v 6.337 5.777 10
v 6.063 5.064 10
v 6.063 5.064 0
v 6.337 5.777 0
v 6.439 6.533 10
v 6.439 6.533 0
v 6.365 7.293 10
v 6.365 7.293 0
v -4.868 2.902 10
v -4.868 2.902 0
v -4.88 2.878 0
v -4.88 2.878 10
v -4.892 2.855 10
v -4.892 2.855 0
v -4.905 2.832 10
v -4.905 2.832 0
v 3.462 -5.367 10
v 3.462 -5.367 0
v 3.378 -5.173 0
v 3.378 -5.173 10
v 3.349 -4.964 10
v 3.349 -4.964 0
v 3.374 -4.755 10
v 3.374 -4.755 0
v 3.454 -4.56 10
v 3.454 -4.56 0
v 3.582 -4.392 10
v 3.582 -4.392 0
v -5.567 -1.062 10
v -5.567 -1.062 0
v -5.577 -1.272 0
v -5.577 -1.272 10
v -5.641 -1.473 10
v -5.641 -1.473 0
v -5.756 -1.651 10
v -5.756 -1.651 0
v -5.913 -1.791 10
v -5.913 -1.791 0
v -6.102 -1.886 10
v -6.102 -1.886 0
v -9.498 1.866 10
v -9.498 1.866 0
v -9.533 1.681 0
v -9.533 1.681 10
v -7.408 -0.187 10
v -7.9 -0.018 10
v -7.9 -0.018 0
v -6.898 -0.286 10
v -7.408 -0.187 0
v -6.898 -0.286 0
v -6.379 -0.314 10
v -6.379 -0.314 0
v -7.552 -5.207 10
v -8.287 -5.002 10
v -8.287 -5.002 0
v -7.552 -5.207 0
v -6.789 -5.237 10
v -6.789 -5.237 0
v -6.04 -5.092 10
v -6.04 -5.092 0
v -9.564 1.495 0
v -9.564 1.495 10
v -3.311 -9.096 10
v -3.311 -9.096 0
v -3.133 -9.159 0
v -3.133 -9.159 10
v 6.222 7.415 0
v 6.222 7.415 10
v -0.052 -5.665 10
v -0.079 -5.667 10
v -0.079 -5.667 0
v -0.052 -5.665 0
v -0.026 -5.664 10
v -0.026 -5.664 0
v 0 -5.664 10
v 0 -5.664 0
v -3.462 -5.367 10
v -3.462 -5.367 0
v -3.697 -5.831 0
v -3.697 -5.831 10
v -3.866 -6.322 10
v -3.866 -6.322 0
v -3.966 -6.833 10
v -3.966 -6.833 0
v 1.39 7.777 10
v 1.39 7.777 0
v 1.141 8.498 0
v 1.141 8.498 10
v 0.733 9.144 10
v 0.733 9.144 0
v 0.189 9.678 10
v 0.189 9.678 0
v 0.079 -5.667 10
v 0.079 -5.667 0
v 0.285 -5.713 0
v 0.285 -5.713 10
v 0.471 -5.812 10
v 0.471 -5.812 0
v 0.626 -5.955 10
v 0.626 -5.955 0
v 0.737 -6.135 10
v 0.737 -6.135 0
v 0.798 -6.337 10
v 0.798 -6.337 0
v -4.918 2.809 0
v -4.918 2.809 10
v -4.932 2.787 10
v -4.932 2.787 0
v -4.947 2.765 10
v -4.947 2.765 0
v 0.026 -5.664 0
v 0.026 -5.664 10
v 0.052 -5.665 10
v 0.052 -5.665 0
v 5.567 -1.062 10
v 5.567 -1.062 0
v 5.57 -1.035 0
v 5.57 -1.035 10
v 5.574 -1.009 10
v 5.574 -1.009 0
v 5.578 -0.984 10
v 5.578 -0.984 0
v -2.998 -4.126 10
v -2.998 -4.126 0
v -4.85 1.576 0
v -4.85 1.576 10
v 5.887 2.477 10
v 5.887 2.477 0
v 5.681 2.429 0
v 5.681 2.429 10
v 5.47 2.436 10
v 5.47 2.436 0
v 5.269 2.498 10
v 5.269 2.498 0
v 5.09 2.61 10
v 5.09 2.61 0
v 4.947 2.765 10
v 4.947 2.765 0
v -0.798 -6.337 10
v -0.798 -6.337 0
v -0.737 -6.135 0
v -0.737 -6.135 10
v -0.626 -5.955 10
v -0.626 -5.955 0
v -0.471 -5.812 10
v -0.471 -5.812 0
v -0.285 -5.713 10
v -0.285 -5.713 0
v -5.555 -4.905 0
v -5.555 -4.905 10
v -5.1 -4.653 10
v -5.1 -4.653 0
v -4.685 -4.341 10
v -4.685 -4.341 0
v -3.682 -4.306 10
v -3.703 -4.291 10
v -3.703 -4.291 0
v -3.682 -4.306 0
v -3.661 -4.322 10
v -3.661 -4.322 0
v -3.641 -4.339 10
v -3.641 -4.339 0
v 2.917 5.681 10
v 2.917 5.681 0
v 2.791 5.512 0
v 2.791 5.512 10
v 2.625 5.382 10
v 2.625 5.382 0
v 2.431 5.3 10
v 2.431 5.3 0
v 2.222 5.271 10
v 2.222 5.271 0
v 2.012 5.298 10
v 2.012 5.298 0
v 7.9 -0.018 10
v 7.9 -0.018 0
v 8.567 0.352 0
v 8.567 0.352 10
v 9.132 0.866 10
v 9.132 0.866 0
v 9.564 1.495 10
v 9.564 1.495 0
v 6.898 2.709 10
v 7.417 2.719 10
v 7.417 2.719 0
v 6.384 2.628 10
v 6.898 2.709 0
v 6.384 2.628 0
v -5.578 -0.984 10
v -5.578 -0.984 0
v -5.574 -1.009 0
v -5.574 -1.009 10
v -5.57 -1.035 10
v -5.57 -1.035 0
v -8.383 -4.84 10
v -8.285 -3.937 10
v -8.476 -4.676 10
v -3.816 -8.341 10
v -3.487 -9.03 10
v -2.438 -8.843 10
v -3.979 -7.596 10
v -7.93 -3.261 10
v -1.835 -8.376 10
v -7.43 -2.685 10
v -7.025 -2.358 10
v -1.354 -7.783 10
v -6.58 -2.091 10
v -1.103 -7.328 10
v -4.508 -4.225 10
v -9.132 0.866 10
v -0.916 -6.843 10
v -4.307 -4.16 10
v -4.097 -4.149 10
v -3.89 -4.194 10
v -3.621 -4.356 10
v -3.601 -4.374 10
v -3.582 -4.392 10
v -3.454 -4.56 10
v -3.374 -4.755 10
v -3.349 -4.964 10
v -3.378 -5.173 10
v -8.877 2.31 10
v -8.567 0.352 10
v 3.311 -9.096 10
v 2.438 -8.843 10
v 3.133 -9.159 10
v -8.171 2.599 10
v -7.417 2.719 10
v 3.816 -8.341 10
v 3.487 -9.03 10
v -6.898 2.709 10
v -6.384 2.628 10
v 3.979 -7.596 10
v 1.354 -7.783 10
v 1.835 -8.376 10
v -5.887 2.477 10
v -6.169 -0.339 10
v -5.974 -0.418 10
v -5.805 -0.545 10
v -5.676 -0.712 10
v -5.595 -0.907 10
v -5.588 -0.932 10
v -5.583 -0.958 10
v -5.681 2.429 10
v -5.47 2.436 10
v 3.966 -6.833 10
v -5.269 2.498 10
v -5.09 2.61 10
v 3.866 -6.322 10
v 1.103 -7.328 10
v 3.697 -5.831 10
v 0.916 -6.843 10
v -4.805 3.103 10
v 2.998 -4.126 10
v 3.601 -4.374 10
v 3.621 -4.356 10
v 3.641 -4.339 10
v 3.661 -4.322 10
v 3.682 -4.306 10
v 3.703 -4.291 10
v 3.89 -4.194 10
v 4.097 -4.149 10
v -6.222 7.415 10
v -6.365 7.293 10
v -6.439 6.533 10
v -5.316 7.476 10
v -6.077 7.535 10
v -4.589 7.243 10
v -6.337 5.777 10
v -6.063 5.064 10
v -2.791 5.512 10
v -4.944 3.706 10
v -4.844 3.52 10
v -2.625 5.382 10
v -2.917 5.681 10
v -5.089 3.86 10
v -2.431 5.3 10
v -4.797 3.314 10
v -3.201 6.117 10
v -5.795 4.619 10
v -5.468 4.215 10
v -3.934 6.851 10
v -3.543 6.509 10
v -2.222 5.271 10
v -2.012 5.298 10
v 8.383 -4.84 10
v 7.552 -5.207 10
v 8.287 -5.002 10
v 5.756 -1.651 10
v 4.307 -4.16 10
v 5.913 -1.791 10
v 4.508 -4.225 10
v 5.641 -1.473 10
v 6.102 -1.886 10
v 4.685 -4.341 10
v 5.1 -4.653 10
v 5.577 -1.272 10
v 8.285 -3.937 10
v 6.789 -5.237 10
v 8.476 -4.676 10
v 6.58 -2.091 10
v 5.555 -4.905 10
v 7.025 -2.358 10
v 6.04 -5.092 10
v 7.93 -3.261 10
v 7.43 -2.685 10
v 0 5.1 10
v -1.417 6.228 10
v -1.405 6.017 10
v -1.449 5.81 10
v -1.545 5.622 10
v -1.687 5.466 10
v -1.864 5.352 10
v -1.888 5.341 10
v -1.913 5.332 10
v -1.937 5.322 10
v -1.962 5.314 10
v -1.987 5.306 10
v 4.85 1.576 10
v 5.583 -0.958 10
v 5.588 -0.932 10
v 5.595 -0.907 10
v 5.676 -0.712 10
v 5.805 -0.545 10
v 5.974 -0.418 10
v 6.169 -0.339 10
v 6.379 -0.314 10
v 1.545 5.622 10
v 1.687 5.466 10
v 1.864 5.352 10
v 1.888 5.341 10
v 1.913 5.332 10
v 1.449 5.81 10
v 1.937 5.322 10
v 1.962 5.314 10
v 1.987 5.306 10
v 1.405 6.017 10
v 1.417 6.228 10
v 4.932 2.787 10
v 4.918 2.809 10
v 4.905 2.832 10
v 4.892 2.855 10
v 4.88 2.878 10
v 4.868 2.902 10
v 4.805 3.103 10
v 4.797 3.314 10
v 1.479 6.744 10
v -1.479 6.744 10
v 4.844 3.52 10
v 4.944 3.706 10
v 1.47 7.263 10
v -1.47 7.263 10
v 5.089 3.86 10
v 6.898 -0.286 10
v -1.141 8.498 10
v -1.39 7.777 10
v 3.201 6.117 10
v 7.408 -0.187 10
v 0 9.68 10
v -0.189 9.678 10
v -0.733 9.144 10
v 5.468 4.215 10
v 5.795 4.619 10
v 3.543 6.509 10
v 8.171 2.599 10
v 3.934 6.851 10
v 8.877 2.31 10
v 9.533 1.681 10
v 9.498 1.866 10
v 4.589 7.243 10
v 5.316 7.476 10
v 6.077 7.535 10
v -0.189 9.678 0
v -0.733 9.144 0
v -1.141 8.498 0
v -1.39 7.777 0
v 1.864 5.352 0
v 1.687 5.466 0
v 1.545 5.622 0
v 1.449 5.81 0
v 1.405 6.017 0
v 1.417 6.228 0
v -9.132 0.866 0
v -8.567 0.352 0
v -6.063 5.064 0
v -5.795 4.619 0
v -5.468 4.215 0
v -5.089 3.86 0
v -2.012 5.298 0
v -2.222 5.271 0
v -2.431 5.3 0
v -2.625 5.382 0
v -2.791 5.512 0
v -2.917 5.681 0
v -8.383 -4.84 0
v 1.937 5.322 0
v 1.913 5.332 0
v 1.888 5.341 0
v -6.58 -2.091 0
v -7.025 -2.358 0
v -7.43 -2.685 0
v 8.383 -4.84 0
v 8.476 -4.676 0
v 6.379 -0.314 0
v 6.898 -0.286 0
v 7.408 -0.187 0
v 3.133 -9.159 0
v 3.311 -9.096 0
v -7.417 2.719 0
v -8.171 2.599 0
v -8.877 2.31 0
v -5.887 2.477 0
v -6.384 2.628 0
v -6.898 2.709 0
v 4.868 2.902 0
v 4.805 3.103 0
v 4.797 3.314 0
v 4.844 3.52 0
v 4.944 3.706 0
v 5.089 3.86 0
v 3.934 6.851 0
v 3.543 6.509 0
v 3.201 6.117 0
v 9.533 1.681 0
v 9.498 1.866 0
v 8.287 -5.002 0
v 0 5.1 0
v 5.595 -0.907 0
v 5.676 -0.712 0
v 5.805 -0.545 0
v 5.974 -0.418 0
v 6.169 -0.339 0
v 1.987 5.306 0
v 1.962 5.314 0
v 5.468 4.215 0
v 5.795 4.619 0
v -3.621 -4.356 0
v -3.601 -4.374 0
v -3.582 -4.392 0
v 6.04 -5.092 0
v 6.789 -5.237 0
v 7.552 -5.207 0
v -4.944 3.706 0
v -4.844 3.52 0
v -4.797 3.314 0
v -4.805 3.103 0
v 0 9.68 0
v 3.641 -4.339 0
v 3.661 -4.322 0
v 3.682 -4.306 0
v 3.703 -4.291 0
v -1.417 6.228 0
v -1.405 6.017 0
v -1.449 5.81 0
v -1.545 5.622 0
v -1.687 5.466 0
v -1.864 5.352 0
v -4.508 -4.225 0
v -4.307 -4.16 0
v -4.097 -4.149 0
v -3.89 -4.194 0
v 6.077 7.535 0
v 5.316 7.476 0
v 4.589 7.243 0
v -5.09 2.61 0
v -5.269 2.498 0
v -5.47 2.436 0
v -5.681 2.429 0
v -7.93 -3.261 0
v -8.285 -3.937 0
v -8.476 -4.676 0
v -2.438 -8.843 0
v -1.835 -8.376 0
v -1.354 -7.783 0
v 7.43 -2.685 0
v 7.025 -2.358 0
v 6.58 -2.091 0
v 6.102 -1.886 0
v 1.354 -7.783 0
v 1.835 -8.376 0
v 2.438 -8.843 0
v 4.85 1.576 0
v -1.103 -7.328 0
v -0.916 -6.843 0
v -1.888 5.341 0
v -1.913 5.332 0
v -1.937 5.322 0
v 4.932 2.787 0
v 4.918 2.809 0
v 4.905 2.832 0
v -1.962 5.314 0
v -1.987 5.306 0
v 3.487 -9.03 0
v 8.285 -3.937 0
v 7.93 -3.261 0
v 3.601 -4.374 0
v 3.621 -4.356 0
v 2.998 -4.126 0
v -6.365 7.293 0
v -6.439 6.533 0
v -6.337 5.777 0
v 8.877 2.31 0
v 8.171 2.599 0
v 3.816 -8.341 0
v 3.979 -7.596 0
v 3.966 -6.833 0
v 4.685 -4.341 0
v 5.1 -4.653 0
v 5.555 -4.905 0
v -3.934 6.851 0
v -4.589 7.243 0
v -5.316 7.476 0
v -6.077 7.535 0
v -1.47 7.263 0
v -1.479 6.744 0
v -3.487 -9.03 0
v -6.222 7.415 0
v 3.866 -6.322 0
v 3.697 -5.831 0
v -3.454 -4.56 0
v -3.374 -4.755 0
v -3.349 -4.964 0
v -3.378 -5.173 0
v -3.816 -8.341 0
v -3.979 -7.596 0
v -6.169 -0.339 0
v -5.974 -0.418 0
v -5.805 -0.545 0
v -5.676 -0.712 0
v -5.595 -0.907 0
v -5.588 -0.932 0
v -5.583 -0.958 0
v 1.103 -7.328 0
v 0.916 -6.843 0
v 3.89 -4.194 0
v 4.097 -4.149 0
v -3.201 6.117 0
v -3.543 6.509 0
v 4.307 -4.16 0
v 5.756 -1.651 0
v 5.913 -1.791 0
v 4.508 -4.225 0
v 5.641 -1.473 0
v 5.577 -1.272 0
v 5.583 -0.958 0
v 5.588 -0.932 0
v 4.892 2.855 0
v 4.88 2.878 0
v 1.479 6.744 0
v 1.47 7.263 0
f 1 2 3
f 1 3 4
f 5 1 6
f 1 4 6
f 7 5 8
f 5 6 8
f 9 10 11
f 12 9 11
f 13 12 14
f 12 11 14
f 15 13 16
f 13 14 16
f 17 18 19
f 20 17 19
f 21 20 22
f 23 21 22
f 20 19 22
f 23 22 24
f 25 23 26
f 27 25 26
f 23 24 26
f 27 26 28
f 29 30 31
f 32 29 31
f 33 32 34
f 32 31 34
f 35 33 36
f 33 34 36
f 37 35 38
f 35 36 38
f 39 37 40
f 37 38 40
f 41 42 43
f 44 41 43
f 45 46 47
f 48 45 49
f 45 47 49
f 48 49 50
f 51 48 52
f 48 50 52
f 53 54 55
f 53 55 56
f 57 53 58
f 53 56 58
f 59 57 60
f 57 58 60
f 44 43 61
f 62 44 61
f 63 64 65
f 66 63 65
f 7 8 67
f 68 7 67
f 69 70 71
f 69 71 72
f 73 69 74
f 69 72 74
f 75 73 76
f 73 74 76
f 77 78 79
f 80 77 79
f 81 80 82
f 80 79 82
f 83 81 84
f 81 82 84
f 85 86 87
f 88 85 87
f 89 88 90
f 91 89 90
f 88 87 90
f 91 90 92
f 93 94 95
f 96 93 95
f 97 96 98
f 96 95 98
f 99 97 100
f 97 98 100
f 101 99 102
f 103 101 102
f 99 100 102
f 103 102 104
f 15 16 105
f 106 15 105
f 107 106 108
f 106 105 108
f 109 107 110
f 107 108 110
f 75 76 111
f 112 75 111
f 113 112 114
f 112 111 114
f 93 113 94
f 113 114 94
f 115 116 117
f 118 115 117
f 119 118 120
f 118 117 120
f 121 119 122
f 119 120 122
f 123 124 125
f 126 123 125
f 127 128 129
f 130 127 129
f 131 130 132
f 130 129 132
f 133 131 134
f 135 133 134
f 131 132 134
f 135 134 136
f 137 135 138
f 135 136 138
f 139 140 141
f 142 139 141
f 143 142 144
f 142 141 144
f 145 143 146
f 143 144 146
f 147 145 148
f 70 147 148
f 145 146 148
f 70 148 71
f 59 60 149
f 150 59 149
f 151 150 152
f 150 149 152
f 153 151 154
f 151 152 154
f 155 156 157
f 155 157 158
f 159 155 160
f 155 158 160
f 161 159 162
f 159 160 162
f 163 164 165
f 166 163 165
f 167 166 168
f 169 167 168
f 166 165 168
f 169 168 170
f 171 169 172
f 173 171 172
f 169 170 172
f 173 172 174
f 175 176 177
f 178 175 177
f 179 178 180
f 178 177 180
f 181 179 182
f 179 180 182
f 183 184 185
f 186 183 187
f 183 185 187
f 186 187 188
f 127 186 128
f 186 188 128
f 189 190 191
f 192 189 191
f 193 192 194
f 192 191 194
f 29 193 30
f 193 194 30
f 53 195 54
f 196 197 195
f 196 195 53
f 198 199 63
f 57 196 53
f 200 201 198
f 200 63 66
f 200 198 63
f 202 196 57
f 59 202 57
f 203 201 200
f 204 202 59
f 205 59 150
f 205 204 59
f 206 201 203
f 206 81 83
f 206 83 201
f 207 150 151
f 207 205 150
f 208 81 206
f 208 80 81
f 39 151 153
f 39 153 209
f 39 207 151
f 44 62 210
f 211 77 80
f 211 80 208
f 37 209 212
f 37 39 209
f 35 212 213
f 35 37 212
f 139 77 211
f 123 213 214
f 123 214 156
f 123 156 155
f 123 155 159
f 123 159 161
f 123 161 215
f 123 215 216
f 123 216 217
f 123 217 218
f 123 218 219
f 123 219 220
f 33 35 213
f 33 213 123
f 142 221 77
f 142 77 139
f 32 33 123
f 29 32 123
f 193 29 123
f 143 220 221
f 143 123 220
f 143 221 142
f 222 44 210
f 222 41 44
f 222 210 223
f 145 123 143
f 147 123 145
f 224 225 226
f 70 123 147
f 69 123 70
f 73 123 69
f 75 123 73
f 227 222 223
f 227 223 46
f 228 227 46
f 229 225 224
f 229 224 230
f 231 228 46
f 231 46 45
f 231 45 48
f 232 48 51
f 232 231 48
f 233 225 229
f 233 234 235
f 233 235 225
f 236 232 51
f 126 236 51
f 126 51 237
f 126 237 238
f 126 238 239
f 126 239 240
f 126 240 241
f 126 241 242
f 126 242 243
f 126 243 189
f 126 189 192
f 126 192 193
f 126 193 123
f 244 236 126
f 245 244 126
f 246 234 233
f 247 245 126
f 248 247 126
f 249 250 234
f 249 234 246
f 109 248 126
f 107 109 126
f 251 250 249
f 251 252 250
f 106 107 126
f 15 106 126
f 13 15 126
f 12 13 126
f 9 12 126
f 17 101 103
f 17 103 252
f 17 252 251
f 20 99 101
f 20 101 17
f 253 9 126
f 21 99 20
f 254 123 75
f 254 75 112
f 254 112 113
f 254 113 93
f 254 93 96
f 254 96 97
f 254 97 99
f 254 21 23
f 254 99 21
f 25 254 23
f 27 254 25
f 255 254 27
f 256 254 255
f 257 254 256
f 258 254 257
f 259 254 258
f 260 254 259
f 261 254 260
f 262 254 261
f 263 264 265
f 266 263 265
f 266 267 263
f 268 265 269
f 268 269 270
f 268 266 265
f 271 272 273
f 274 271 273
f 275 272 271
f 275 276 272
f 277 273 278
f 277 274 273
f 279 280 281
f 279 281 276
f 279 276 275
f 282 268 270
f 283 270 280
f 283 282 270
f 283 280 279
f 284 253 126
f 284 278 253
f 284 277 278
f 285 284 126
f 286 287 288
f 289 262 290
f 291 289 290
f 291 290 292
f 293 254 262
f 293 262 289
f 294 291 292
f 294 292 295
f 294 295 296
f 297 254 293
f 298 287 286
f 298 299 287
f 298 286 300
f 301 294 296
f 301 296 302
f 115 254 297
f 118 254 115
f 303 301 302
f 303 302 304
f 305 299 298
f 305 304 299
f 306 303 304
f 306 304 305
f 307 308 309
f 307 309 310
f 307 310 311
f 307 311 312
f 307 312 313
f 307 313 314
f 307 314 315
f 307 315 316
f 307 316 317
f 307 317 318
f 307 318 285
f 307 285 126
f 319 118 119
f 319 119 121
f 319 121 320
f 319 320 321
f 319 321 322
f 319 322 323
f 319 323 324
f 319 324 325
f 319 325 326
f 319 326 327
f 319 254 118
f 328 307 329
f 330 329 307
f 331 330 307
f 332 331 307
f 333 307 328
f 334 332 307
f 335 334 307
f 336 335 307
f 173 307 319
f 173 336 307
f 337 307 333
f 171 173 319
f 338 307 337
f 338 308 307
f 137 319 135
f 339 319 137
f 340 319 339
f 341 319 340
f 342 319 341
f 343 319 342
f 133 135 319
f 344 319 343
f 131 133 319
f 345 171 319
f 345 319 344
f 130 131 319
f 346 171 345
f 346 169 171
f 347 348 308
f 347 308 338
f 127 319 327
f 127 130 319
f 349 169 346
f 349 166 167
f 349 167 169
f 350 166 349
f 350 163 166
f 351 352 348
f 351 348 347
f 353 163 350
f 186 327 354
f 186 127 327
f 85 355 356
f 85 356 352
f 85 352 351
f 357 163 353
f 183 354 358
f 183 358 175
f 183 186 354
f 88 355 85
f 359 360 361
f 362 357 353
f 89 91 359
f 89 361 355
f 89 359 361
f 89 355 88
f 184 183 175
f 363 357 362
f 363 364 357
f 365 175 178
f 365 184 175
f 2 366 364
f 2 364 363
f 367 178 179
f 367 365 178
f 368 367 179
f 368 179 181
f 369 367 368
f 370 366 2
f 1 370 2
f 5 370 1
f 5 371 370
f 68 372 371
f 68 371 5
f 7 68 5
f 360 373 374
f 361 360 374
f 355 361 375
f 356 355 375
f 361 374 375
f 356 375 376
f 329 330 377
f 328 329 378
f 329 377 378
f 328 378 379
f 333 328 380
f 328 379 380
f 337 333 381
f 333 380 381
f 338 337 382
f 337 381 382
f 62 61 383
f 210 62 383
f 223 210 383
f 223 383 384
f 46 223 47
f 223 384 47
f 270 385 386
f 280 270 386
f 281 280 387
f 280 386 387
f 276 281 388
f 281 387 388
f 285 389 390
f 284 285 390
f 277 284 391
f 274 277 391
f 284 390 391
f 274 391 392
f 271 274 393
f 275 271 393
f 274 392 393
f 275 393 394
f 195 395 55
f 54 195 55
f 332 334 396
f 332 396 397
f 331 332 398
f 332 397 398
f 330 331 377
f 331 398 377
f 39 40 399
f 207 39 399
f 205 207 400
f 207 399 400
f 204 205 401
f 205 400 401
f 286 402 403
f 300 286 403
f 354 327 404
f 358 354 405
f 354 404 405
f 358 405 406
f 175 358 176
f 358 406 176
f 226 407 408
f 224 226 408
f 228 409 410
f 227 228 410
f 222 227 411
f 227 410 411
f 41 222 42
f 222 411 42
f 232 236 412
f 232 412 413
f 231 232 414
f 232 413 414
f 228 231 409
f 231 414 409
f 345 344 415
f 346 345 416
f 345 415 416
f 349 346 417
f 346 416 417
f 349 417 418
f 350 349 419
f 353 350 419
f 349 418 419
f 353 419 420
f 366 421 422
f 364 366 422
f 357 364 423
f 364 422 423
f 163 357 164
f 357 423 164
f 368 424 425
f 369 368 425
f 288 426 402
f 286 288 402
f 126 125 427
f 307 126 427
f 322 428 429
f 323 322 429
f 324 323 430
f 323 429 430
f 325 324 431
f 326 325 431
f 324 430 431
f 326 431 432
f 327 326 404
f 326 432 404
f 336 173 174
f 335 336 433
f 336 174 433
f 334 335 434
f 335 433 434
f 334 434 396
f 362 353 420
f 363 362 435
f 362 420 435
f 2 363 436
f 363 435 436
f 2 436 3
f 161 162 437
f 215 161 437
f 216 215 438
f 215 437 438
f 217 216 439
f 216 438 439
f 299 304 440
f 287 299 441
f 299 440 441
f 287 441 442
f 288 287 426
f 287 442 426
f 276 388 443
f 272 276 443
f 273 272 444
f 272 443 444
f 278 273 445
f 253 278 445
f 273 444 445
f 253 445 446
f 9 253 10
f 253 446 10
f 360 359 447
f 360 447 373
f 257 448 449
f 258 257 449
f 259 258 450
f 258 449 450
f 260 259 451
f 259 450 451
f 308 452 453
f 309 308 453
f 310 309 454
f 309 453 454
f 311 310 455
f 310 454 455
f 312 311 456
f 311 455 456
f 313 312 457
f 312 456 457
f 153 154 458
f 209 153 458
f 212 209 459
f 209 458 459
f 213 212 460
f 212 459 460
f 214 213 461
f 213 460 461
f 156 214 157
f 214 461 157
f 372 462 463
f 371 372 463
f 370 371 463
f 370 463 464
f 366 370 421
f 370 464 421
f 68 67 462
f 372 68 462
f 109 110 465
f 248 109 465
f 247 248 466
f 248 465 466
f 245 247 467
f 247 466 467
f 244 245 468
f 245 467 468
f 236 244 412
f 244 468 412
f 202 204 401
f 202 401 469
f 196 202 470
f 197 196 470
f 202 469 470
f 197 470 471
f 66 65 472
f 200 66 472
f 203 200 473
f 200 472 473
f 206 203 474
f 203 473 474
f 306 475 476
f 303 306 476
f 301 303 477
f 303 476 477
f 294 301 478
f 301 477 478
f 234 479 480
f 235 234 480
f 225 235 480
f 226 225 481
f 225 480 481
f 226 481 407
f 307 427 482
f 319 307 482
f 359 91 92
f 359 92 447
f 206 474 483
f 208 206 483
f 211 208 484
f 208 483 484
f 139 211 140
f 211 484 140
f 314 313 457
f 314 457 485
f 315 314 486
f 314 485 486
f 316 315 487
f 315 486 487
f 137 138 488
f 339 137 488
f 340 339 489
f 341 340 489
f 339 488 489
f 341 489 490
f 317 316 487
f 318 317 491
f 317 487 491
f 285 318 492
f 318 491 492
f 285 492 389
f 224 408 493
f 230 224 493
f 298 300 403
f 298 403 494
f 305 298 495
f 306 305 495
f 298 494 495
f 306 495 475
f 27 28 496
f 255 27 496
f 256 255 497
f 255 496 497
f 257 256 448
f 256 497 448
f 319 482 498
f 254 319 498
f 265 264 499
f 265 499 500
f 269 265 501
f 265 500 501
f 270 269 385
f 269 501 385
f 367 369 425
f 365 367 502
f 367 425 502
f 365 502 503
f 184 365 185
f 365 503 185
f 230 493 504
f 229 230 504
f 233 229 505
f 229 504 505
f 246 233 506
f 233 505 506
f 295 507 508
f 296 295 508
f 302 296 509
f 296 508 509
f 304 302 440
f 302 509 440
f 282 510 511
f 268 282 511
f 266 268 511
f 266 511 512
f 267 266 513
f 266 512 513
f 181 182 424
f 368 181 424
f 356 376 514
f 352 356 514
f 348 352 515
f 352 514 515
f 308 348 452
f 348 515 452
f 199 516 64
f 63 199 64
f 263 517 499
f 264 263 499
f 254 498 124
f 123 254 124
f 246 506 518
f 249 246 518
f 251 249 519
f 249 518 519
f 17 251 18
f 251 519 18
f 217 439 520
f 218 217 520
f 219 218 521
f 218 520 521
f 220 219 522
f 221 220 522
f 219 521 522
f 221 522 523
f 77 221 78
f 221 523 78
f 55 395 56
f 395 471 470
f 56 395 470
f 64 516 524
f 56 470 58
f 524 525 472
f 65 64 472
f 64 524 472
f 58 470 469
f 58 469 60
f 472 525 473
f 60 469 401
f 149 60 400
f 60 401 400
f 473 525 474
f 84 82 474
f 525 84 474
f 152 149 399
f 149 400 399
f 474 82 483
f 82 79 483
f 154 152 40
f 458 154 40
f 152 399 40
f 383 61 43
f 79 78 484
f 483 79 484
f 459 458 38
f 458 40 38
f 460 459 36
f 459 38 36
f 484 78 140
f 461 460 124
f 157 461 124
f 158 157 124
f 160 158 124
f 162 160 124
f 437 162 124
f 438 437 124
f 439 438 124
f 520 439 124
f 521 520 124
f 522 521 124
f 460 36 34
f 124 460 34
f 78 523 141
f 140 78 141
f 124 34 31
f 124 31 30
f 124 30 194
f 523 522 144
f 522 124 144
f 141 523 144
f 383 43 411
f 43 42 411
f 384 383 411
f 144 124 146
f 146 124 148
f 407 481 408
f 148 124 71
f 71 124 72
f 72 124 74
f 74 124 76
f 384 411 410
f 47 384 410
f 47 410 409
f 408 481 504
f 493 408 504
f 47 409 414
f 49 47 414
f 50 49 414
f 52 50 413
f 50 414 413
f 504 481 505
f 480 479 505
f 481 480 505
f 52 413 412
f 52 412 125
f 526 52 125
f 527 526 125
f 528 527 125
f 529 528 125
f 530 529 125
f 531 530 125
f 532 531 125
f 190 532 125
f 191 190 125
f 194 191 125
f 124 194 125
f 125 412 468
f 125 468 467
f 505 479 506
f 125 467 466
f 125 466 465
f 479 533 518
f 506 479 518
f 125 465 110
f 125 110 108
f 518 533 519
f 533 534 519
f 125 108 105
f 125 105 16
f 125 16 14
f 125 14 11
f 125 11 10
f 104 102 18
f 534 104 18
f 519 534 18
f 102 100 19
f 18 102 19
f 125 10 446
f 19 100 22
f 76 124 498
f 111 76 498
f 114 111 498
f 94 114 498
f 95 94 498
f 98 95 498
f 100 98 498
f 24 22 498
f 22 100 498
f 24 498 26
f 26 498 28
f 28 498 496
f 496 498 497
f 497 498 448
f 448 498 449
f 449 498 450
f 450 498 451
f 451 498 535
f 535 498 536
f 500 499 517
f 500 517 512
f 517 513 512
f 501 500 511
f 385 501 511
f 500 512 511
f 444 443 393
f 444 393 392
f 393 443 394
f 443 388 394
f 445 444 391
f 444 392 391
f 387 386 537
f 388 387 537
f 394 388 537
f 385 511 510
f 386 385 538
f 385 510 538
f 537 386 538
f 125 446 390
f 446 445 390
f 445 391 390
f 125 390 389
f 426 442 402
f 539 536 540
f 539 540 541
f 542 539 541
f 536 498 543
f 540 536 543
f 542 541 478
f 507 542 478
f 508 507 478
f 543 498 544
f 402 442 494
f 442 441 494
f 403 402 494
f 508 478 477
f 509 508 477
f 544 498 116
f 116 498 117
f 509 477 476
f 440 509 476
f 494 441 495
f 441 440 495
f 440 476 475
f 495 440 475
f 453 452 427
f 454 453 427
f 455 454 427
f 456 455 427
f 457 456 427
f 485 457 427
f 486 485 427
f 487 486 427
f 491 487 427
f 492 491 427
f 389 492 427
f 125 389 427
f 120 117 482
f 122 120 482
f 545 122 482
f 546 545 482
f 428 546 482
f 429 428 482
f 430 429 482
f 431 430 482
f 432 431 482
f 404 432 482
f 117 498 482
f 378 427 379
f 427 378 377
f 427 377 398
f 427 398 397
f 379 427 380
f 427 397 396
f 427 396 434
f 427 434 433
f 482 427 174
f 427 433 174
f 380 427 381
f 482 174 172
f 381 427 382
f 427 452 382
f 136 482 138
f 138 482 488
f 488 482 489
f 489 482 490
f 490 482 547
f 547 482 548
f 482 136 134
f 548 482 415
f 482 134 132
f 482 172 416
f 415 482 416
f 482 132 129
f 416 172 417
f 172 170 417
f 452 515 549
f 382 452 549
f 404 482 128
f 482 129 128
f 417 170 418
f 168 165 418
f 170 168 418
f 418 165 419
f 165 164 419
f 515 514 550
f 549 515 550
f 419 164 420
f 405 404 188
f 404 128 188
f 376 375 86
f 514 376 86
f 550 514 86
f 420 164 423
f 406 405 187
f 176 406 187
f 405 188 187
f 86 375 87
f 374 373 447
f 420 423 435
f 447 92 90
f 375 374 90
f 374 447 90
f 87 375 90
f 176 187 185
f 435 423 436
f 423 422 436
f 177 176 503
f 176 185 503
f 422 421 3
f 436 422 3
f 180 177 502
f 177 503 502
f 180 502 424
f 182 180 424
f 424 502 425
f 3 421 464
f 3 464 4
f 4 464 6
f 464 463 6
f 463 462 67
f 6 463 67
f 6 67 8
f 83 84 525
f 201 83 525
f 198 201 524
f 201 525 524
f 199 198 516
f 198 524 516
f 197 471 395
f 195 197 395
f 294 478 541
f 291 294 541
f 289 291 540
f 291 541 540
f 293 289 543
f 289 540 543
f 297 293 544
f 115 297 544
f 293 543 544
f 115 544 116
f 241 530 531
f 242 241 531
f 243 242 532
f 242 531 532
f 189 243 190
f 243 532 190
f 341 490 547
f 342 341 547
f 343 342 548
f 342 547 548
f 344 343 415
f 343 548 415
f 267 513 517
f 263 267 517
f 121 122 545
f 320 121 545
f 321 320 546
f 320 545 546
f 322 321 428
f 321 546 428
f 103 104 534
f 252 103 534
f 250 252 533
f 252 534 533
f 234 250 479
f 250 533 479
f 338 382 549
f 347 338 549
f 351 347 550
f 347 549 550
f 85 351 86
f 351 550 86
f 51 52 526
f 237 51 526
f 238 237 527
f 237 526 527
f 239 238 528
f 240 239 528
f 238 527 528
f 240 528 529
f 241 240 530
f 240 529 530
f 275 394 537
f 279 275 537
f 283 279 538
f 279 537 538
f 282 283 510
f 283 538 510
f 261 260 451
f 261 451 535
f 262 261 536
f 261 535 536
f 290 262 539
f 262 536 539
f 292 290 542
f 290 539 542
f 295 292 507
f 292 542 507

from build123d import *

# Parameters (mm, degrees)
F1_DEPTH = 10


with BuildPart() as f1:
    # F0 (on Top) → F1 (new body)
    with BuildSketch(Plane.XY):
        with BuildLine():
            ThreePointArc((1.864316, 5.3522), (1.490455, 5.713083), (1.417156, 6.227511))
            ThreePointArc((1.417156, 6.227511), (1.483836, 7.003606), (1.389552, 7.776834))
            ThreePointArc((1.389552, 7.776834), (0.955753, 8.832789), (0.188574, 9.678163))
            Line((0.188574, 9.678163), (0, 9.68))
            Line((0, 9.68), (-0.188574, 9.678163))
            ThreePointArc((-0.188574, 9.678163), (-0.955753, 8.832789), (-1.389552, 7.776834))
            ThreePointArc((-1.389552, 7.776834), (-1.483836, 7.003606), (-1.417156, 6.227511))
            ThreePointArc((-1.417156, 6.227511), (-1.490455, 5.713083), (-1.864316, 5.3522))
            ThreePointArc((-1.864316, 5.3522), (-1.900395, 5.336418), (-1.937206, 5.32243))
            ThreePointArc((-1.937206, 5.32243), (-1.974396, 5.309483), (-2.012179, 5.298382))
            ThreePointArc((-2.012179, 5.298382), (-2.530544, 5.334521), (-2.917363, 5.68148))
            ThreePointArc((-2.917363, 5.68148), (-3.365147, 6.318865), (-3.934394, 6.850587))
            ThreePointArc((-3.934394, 6.850587), (-4.945458, 7.380655), (-6.076547, 7.535116))
            Line((-6.076547, 7.535116), (-6.222184, 7.41531))
            Line((-6.222184, 7.41531), (-6.365459, 7.29269))
            ThreePointArc((-6.365459, 7.29269), (-6.409757, 6.151962), (-6.063311, 5.064213))
            ThreePointArc((-6.063311, 5.064213), (-5.638516, 4.411282), (-5.088571, 3.85962))
            ThreePointArc((-5.088571, 3.85962), (-4.814053, 3.418429), (-4.868477, 2.901664))
            ThreePointArc((-4.868477, 2.901664), (-4.88597, 2.866383), (-4.905178, 2.832006))
            ThreePointArc((-4.905178, 2.832006), (-4.925345, 2.798183), (-4.947153, 2.765393))
            ThreePointArc((-4.947153, 2.765393), (-5.367473, 2.459878), (-5.886814, 2.477022))
            ThreePointArc((-5.886814, 2.477022), (-6.63954, 2.677457), (-7.417393, 2.718875))
            ThreePointArc((-7.417393, 2.718875), (-8.532634, 2.475031), (-9.498384, 1.866304))
            Line((-9.498384, 1.866304), (-9.532939, 1.680914))
            Line((-9.532939, 1.680914), (-9.563876, 1.494886))
            ThreePointArc((-9.563876, 1.494886), (-8.864564, 0.592564), (-7.899979, -0.018009))
            ThreePointArc((-7.899979, -0.018009), (-7.154871, -0.24513), (-6.378987, -0.31423))
            ThreePointArc((-6.378987, -0.31423), (-5.885103, -0.475745), (-5.594623, -0.906593))
            ThreePointArc((-5.594623, -0.906593), (-5.585346, -0.944864), (-5.577963, -0.983545))
            ThreePointArc((-5.577963, -0.983545), (-5.571671, -1.022419), (-5.567299, -1.061555))
            ThreePointArc((-5.567299, -1.061555), (-5.692902, -1.56577), (-6.10176, -1.886463))
            ThreePointArc((-6.10176, -1.886463), (-6.807219, -2.216763), (-7.429712, -2.685029))
            ThreePointArc((-7.429712, -2.685029), (-8.127296, -3.588688), (-8.475822, -4.675772))
            Line((-8.475822, -4.675772), (-8.383126, -4.84))
            Line((-8.383126, -4.84), (-8.287248, -5.002391))
            ThreePointArc((-8.287248, -5.002391), (-7.171543, -5.244101), (-6.04016, -5.091804))
            ThreePointArc((-6.04016, -5.091804), (-5.323383, -4.786843), (-4.684605, -4.341048))
            ThreePointArc((-4.684605, -4.341048), (-4.202447, -4.147313), (-3.702983, -4.290645))
            ThreePointArc((-3.702983, -4.290645), (-3.671276, -4.313999), (-3.640757, -4.338885))
            ThreePointArc((-3.640757, -4.338885), (-3.610949, -4.364619), (-3.582444, -4.391789))
            ThreePointArc((-3.582444, -4.391789), (-3.354559, -4.858776), (-3.461625, -5.36725))
            ThreePointArc((-3.461625, -5.36725), (-3.789724, -6.073735), (-3.965586, -6.832579))
            ThreePointArc((-3.965586, -6.832579), (-3.919106, -7.973219), (-3.487328, -9.030002))
            Line((-3.487328, -9.030002), (-3.310755, -9.096225))
            Line((-3.310755, -9.096225), (-3.132925, -9.158994))
            ThreePointArc((-3.132925, -9.158994), (-2.122877, -8.626993), (-1.354082, -7.783088))
            ThreePointArc((-1.354082, -7.783088), (-1.001025, -7.088739), (-0.798243, -6.336642))
            ThreePointArc((-0.798243, -6.336642), (-0.55342, -5.878307), (-0.078676, -5.667056))
            ThreePointArc((-0.078676, -5.667056), (-0.039376, -5.664566), (0, -5.664012))
            ThreePointArc((0, -5.664012), (0.039376, -5.664566), (0.078676, -5.667056))
            ThreePointArc((0.078676, -5.667056), (0.55342, -5.878307), (0.798243, -6.336642))
            ThreePointArc((0.798243, -6.336642), (1.001025, -7.088739), (1.354082, -7.783088))
            ThreePointArc((1.354082, -7.783088), (2.122877, -8.626993), (3.132925, -9.158994))
            Line((3.132925, -9.158994), (3.310755, -9.096225))
            Line((3.310755, -9.096225), (3.487328, -9.030002))
            ThreePointArc((3.487328, -9.030002), (3.919106, -7.973219), (3.965586, -6.832579))
            ThreePointArc((3.965586, -6.832579), (3.789724, -6.073735), (3.461625, -5.36725))
            ThreePointArc((3.461625, -5.36725), (3.354559, -4.858776), (3.582444, -4.391789))
            ThreePointArc((3.582444, -4.391789), (3.610949, -4.364619), (3.640757, -4.338885))
            ThreePointArc((3.640757, -4.338885), (3.671276, -4.313999), (3.702983, -4.290645))
            ThreePointArc((3.702983, -4.290645), (4.202447, -4.147313), (4.684605, -4.341048))
            ThreePointArc((4.684605, -4.341048), (5.323383, -4.786843), (6.04016, -5.091804))
            ThreePointArc((6.04016, -5.091804), (7.171543, -5.244101), (8.287248, -5.002391))
            Line((8.287248, -5.002391), (8.383126, -4.84))
            Line((8.383126, -4.84), (8.475822, -4.675772))
            ThreePointArc((8.475822, -4.675772), (8.127296, -3.588688), (7.429712, -2.685029))
            ThreePointArc((7.429712, -2.685029), (6.807219, -2.216763), (6.10176, -1.886463))
            ThreePointArc((6.10176, -1.886463), (5.692902, -1.56577), (5.567299, -1.061555))
            ThreePointArc((5.567299, -1.061555), (5.571671, -1.022419), (5.577963, -0.983545))
            ThreePointArc((5.577963, -0.983545), (5.585346, -0.944864), (5.594623, -0.906593))
            ThreePointArc((5.594623, -0.906593), (5.885103, -0.475745), (6.378987, -0.31423))
            ThreePointArc((6.378987, -0.31423), (7.154871, -0.24513), (7.899979, -0.018009))
            ThreePointArc((7.899979, -0.018009), (8.864564, 0.592564), (9.563876, 1.494886))
            Line((9.563876, 1.494886), (9.532939, 1.680914))
            Line((9.532939, 1.680914), (9.498384, 1.866304))
            ThreePointArc((9.498384, 1.866304), (8.532634, 2.475031), (7.417393, 2.718875))
            ThreePointArc((7.417393, 2.718875), (6.63954, 2.677457), (5.886814, 2.477022))
            ThreePointArc((5.886814, 2.477022), (5.367473, 2.459878), (4.947153, 2.765393))
            ThreePointArc((4.947153, 2.765393), (4.925345, 2.798183), (4.905178, 2.832006))
            ThreePointArc((4.905178, 2.832006), (4.88597, 2.866383), (4.868477, 2.901664))
            ThreePointArc((4.868477, 2.901664), (4.814053, 3.418429), (5.088571, 3.85962))
            ThreePointArc((5.088571, 3.85962), (5.638516, 4.411282), (6.063311, 5.064213))
            ThreePointArc((6.063311, 5.064213), (6.409757, 6.151962), (6.365459, 7.29269))
            Line((6.365459, 7.29269), (6.222184, 7.41531))
            Line((6.222184, 7.41531), (6.076547, 7.535116))
            ThreePointArc((6.076547, 7.535116), (4.945458, 7.380655), (3.934394, 6.850587))
            ThreePointArc((3.934394, 6.850587), (3.365147, 6.318865), (2.917363, 5.68148))
            ThreePointArc((2.917363, 5.68148), (2.530544, 5.334521), (2.012179, 5.298382))
            ThreePointArc((2.012179, 5.298382), (1.974396, 5.309483), (1.937206, 5.32243))
            ThreePointArc((1.937206, 5.32243), (1.900395, 5.336418), (1.864316, 5.3522))
        make_face()
        Polygon((0, 5.1), (4.850388, 1.575987), (2.997705, -4.125987), (-2.997705, -4.125987), (-4.850388, 1.575987), align=None, mode=Mode.SUBTRACT)
    extrude(amount=F1_DEPTH)


solid = f1.part
